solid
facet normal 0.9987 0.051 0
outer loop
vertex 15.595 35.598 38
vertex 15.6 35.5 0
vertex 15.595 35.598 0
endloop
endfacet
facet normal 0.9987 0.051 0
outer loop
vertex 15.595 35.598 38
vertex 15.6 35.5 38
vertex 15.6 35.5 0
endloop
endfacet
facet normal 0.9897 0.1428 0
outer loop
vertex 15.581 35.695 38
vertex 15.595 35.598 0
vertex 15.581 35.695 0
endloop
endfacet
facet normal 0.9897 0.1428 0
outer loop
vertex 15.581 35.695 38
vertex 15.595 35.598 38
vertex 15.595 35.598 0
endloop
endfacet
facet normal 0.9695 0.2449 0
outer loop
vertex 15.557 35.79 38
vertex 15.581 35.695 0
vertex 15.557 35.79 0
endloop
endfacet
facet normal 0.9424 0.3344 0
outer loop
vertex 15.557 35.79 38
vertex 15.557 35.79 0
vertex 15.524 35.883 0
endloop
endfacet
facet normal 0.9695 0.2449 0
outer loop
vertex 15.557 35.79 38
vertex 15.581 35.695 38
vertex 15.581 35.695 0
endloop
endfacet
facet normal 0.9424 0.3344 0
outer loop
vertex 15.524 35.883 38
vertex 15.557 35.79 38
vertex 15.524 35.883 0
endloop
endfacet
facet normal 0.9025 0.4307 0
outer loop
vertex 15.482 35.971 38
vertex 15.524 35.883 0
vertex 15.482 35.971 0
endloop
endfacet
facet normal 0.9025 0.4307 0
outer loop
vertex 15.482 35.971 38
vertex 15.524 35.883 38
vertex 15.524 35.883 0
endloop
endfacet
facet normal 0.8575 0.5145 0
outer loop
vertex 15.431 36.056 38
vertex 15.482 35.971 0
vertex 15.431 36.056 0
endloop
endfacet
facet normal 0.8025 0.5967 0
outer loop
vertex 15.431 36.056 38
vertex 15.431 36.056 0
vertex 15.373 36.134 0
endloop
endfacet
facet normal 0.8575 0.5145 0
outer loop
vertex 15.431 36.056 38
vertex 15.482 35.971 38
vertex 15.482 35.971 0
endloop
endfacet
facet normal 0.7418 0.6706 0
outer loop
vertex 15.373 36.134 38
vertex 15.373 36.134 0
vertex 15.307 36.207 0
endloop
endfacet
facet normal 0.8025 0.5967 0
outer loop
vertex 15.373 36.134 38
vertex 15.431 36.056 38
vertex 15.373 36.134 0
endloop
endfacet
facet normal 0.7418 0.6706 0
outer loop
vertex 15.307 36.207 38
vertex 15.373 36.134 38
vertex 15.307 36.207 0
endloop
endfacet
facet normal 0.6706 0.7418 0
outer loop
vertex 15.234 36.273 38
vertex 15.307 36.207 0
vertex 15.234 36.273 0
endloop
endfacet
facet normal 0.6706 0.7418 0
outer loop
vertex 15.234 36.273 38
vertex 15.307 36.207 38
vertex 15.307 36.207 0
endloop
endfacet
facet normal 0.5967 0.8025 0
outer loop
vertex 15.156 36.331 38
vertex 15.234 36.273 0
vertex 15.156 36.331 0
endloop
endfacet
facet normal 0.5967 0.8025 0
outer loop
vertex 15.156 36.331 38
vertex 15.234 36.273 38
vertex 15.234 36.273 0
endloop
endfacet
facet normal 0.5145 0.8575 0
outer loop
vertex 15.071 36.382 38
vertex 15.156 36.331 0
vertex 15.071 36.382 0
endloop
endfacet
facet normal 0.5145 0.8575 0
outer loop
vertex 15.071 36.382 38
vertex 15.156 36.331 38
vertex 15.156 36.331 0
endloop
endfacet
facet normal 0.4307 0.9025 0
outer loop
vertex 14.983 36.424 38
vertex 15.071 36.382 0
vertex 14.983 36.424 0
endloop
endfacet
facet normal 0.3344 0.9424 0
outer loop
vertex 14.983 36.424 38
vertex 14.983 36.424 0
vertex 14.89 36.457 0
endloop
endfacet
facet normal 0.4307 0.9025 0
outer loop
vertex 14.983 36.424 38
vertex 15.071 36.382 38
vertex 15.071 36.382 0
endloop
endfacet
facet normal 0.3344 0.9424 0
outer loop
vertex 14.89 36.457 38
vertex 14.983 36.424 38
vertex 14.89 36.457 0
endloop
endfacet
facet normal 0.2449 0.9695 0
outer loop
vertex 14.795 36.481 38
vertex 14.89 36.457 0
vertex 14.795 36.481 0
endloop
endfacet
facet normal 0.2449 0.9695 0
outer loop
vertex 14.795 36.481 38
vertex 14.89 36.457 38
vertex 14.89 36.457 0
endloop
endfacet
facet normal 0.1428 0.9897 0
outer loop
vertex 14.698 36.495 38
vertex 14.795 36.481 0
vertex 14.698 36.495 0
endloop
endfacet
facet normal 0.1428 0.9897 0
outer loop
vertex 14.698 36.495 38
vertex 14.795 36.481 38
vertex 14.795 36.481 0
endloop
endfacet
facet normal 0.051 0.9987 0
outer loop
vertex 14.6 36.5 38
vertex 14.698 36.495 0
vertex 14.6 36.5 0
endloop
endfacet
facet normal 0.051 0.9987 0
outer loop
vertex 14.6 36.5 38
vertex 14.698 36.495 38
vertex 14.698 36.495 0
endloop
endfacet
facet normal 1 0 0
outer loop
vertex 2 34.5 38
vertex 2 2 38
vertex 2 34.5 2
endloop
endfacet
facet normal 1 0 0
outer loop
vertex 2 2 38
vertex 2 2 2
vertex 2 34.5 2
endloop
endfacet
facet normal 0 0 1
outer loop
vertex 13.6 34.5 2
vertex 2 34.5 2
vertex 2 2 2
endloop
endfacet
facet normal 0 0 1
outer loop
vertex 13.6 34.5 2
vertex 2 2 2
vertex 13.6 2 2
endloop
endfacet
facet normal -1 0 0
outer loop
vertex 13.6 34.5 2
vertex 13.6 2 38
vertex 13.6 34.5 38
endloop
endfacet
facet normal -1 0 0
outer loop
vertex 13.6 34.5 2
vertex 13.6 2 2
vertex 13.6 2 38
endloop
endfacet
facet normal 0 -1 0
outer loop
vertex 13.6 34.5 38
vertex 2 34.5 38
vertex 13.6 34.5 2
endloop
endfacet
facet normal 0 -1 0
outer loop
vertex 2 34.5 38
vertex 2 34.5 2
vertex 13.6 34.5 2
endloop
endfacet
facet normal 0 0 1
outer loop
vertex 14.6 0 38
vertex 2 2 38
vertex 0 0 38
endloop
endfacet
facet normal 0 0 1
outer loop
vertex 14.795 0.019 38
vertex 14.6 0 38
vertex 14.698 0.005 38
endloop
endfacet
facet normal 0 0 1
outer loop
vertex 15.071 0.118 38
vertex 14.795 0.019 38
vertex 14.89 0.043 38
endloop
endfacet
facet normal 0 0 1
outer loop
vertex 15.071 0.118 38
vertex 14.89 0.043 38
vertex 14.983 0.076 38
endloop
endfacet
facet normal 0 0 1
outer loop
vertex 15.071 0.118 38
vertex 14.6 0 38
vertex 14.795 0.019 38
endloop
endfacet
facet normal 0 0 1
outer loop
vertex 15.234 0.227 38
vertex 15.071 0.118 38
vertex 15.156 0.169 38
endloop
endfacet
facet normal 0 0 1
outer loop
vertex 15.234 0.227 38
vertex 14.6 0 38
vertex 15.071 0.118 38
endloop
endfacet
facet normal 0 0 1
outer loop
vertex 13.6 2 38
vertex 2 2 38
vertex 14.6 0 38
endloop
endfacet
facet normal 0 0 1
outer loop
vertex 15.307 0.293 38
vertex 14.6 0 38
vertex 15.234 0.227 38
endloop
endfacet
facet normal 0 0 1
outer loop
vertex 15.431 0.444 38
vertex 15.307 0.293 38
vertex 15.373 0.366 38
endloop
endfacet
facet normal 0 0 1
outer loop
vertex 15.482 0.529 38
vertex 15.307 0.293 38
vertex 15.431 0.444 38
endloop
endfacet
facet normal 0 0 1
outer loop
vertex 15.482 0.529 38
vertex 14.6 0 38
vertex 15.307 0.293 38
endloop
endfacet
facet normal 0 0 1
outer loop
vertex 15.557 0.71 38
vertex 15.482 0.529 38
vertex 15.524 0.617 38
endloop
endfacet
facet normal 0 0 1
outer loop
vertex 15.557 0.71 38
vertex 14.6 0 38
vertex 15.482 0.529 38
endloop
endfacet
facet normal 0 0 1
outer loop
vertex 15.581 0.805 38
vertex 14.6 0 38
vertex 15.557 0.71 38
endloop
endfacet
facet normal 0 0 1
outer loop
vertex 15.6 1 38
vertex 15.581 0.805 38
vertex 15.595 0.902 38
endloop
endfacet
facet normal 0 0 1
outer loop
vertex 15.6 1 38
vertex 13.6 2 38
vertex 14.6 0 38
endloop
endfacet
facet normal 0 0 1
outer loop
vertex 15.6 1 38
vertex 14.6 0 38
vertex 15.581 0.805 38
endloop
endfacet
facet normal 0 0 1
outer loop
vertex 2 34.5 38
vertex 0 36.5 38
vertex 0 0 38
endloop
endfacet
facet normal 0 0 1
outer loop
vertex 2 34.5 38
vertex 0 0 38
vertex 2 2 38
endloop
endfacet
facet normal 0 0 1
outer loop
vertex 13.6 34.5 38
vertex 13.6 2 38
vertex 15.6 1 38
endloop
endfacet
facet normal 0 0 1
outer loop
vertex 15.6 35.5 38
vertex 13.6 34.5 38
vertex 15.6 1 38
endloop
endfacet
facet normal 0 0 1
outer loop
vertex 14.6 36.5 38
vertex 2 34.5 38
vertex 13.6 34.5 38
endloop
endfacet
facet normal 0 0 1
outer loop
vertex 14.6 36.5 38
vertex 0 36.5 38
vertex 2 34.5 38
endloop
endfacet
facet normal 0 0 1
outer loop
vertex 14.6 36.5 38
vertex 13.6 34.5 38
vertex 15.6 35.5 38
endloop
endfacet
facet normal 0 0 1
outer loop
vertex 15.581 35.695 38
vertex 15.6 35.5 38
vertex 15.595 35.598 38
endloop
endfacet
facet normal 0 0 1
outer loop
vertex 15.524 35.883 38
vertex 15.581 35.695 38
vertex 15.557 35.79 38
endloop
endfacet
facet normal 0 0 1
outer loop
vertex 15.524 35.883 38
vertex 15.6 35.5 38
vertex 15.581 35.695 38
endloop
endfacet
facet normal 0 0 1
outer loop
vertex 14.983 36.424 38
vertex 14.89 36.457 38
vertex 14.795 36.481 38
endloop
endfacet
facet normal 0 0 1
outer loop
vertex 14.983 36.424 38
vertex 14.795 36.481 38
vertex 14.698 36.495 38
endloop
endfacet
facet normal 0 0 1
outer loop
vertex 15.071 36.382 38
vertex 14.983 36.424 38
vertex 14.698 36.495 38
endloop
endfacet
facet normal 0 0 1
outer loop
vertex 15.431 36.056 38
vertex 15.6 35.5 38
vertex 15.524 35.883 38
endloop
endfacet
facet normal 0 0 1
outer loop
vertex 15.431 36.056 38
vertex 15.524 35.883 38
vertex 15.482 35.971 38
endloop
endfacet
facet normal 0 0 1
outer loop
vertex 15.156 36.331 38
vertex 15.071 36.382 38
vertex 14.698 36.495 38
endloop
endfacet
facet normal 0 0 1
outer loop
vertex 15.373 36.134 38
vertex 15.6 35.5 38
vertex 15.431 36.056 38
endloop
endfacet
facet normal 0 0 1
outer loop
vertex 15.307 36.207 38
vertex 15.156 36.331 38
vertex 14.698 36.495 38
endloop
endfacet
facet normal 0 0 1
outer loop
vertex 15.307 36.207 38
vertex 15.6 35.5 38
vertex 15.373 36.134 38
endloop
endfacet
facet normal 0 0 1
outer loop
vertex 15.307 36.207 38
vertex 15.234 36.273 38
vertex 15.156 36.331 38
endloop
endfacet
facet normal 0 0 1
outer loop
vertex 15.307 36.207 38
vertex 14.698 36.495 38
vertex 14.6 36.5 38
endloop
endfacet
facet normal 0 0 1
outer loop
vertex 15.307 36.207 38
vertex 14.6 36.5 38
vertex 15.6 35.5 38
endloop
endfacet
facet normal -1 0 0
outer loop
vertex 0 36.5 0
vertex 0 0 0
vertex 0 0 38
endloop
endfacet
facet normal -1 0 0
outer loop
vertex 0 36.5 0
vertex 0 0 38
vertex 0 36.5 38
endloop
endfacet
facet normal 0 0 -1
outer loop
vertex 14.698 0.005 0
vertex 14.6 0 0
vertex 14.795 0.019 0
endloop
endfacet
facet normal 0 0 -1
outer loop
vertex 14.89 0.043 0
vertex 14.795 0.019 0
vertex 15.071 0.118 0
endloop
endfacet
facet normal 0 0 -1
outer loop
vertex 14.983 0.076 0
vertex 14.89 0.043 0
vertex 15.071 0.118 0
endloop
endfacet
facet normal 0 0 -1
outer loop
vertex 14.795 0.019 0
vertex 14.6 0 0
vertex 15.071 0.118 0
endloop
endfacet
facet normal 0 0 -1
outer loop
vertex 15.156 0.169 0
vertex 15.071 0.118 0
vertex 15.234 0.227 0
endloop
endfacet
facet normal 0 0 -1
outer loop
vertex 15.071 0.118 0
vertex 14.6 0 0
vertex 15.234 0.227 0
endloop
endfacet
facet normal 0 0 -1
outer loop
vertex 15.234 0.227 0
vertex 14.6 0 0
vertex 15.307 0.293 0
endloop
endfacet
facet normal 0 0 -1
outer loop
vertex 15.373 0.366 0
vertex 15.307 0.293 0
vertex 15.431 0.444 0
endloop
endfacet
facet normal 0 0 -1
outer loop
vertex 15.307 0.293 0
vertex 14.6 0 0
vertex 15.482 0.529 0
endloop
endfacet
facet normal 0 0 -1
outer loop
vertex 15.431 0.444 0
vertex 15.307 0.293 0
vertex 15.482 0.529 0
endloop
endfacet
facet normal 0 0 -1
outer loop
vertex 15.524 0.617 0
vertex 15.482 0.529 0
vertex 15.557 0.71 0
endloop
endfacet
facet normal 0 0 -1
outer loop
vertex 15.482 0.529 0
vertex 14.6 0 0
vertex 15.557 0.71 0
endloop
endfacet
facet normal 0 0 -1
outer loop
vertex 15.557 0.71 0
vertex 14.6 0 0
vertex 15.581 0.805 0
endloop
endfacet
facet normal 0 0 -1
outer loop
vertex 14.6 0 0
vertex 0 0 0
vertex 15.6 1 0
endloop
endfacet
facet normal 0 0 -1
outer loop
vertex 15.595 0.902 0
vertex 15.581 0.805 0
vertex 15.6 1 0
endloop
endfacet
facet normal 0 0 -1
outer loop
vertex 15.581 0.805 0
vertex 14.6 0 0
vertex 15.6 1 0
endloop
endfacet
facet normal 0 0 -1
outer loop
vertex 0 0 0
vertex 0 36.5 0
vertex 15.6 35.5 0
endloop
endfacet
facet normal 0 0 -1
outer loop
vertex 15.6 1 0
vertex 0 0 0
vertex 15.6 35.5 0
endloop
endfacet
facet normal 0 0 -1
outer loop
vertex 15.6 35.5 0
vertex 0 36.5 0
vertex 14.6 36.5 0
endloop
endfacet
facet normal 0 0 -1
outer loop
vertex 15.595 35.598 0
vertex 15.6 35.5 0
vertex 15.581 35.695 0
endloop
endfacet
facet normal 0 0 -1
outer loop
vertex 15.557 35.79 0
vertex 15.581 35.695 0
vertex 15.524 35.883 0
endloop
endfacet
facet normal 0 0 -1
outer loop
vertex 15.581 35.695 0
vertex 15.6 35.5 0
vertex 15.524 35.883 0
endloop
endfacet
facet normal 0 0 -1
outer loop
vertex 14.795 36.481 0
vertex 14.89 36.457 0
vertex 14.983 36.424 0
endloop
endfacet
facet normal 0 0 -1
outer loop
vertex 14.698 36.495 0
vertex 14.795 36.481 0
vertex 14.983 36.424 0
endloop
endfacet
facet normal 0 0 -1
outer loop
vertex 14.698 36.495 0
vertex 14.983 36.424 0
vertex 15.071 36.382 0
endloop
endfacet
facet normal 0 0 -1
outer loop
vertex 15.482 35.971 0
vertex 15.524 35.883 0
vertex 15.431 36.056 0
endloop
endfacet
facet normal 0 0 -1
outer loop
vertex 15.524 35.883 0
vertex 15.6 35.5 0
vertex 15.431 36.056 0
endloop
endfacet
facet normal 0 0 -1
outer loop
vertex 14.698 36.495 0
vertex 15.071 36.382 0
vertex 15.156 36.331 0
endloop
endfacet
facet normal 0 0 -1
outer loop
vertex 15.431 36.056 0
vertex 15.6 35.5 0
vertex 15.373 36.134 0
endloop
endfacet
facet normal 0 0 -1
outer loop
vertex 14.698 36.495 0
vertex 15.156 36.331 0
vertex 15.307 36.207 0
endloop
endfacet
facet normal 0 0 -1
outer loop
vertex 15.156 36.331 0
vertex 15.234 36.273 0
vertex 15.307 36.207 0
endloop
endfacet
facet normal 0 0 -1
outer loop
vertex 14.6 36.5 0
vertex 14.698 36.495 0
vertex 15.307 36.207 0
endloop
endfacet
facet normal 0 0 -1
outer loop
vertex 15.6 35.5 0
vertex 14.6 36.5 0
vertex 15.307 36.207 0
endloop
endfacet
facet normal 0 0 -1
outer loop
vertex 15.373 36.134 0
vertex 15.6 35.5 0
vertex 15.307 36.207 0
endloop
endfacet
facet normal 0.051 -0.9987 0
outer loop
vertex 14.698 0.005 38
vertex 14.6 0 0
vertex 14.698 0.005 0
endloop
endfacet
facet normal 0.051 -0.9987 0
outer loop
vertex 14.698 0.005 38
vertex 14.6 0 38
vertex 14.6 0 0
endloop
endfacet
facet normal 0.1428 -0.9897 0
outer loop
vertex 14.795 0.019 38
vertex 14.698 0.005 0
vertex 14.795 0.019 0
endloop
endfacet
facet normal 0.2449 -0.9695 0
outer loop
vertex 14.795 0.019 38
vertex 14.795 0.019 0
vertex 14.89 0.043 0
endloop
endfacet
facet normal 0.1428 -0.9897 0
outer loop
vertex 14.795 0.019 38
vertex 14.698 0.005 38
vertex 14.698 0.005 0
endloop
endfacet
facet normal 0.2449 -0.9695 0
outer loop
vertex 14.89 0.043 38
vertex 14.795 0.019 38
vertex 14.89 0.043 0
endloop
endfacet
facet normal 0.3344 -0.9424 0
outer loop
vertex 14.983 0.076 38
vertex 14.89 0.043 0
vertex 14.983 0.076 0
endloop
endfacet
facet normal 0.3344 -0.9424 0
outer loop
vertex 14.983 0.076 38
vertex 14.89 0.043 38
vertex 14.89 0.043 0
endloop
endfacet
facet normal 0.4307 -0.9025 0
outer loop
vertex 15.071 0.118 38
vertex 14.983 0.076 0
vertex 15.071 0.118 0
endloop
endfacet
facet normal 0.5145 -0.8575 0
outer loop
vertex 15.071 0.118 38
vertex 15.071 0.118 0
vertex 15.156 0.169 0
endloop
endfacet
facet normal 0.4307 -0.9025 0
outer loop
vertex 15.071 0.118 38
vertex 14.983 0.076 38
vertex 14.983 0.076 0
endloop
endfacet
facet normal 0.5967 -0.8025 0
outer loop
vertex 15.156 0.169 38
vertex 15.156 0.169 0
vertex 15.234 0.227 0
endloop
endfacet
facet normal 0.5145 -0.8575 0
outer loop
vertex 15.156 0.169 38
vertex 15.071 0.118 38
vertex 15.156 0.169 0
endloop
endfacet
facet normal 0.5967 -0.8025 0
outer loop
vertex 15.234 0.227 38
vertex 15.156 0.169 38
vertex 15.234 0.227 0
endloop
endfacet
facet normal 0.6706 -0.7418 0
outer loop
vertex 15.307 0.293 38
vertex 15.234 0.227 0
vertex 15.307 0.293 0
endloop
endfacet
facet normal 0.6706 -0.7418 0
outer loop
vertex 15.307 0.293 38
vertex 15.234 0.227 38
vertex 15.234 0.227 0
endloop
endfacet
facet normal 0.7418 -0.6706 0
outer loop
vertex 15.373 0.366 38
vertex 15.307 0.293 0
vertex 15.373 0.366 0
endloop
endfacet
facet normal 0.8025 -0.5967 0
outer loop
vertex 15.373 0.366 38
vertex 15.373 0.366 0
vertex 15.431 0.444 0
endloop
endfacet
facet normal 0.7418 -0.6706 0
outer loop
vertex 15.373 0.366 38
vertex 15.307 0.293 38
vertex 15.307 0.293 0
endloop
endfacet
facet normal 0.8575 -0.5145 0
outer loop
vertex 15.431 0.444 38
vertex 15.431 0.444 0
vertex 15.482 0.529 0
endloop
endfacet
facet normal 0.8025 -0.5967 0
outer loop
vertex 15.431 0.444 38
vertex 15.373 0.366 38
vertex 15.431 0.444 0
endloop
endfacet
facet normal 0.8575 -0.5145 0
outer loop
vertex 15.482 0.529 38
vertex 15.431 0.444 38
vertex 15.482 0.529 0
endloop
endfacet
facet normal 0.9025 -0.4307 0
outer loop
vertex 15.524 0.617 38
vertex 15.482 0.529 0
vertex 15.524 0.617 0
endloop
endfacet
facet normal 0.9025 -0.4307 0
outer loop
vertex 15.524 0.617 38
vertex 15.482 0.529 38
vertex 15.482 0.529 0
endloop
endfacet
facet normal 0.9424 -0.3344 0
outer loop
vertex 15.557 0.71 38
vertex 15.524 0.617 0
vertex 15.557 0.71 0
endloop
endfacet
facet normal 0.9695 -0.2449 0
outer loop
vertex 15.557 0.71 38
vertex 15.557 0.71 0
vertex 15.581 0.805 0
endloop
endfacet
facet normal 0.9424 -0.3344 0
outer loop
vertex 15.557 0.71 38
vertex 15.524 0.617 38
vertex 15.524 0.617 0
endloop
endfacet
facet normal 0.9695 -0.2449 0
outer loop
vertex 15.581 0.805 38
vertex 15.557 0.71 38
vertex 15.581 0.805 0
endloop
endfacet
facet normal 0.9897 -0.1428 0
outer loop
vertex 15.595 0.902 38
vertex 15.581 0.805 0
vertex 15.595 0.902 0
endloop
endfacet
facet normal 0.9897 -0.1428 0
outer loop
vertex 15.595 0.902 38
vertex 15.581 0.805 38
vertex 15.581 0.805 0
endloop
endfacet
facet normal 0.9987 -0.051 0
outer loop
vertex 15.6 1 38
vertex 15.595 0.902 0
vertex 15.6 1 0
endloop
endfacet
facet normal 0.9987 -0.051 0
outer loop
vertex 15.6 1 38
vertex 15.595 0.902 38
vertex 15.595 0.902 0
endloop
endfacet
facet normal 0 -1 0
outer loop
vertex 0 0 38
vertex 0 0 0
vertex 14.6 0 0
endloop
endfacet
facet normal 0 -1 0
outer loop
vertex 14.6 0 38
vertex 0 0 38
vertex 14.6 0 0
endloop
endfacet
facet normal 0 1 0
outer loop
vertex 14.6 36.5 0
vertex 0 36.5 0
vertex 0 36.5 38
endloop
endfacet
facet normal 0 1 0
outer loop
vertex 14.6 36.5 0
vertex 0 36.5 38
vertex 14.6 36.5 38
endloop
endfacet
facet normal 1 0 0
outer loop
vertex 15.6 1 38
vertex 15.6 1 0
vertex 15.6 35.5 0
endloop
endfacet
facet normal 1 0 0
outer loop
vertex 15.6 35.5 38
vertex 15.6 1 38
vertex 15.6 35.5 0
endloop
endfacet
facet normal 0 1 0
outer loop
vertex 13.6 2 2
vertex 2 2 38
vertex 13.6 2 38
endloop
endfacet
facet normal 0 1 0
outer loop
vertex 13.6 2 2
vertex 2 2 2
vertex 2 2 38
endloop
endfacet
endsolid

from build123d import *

# Parameters (mm, degrees)
F0_W     = 15.6
F0_H     = 36.5
F1_DEPTH = 38
F2_T     = -2
F3_R     = 1


with BuildPart() as f1:
    # F0 (on Top) → F1 (new body)
    with BuildSketch(Plane.XY):
        with Locations((7.8, 18.25)):
            Rectangle(F0_W, F0_H)
    extrude(amount=F1_DEPTH)

    # F2
    f2_openings = [f1.faces().sort_by_distance(p)[0] for p in [
        (7.8, 18.25, 38),
    ]]
    offset(amount=F2_T, openings=f2_openings)

    # F3
    f3_edges = [f1.edges().sort_by_distance(p)[0] for p in [
        (15.6, 0, 19),
        (15.6, 36.5, 19),
    ]]
    fillet(f3_edges, radius=F3_R)


solid = f1.part
